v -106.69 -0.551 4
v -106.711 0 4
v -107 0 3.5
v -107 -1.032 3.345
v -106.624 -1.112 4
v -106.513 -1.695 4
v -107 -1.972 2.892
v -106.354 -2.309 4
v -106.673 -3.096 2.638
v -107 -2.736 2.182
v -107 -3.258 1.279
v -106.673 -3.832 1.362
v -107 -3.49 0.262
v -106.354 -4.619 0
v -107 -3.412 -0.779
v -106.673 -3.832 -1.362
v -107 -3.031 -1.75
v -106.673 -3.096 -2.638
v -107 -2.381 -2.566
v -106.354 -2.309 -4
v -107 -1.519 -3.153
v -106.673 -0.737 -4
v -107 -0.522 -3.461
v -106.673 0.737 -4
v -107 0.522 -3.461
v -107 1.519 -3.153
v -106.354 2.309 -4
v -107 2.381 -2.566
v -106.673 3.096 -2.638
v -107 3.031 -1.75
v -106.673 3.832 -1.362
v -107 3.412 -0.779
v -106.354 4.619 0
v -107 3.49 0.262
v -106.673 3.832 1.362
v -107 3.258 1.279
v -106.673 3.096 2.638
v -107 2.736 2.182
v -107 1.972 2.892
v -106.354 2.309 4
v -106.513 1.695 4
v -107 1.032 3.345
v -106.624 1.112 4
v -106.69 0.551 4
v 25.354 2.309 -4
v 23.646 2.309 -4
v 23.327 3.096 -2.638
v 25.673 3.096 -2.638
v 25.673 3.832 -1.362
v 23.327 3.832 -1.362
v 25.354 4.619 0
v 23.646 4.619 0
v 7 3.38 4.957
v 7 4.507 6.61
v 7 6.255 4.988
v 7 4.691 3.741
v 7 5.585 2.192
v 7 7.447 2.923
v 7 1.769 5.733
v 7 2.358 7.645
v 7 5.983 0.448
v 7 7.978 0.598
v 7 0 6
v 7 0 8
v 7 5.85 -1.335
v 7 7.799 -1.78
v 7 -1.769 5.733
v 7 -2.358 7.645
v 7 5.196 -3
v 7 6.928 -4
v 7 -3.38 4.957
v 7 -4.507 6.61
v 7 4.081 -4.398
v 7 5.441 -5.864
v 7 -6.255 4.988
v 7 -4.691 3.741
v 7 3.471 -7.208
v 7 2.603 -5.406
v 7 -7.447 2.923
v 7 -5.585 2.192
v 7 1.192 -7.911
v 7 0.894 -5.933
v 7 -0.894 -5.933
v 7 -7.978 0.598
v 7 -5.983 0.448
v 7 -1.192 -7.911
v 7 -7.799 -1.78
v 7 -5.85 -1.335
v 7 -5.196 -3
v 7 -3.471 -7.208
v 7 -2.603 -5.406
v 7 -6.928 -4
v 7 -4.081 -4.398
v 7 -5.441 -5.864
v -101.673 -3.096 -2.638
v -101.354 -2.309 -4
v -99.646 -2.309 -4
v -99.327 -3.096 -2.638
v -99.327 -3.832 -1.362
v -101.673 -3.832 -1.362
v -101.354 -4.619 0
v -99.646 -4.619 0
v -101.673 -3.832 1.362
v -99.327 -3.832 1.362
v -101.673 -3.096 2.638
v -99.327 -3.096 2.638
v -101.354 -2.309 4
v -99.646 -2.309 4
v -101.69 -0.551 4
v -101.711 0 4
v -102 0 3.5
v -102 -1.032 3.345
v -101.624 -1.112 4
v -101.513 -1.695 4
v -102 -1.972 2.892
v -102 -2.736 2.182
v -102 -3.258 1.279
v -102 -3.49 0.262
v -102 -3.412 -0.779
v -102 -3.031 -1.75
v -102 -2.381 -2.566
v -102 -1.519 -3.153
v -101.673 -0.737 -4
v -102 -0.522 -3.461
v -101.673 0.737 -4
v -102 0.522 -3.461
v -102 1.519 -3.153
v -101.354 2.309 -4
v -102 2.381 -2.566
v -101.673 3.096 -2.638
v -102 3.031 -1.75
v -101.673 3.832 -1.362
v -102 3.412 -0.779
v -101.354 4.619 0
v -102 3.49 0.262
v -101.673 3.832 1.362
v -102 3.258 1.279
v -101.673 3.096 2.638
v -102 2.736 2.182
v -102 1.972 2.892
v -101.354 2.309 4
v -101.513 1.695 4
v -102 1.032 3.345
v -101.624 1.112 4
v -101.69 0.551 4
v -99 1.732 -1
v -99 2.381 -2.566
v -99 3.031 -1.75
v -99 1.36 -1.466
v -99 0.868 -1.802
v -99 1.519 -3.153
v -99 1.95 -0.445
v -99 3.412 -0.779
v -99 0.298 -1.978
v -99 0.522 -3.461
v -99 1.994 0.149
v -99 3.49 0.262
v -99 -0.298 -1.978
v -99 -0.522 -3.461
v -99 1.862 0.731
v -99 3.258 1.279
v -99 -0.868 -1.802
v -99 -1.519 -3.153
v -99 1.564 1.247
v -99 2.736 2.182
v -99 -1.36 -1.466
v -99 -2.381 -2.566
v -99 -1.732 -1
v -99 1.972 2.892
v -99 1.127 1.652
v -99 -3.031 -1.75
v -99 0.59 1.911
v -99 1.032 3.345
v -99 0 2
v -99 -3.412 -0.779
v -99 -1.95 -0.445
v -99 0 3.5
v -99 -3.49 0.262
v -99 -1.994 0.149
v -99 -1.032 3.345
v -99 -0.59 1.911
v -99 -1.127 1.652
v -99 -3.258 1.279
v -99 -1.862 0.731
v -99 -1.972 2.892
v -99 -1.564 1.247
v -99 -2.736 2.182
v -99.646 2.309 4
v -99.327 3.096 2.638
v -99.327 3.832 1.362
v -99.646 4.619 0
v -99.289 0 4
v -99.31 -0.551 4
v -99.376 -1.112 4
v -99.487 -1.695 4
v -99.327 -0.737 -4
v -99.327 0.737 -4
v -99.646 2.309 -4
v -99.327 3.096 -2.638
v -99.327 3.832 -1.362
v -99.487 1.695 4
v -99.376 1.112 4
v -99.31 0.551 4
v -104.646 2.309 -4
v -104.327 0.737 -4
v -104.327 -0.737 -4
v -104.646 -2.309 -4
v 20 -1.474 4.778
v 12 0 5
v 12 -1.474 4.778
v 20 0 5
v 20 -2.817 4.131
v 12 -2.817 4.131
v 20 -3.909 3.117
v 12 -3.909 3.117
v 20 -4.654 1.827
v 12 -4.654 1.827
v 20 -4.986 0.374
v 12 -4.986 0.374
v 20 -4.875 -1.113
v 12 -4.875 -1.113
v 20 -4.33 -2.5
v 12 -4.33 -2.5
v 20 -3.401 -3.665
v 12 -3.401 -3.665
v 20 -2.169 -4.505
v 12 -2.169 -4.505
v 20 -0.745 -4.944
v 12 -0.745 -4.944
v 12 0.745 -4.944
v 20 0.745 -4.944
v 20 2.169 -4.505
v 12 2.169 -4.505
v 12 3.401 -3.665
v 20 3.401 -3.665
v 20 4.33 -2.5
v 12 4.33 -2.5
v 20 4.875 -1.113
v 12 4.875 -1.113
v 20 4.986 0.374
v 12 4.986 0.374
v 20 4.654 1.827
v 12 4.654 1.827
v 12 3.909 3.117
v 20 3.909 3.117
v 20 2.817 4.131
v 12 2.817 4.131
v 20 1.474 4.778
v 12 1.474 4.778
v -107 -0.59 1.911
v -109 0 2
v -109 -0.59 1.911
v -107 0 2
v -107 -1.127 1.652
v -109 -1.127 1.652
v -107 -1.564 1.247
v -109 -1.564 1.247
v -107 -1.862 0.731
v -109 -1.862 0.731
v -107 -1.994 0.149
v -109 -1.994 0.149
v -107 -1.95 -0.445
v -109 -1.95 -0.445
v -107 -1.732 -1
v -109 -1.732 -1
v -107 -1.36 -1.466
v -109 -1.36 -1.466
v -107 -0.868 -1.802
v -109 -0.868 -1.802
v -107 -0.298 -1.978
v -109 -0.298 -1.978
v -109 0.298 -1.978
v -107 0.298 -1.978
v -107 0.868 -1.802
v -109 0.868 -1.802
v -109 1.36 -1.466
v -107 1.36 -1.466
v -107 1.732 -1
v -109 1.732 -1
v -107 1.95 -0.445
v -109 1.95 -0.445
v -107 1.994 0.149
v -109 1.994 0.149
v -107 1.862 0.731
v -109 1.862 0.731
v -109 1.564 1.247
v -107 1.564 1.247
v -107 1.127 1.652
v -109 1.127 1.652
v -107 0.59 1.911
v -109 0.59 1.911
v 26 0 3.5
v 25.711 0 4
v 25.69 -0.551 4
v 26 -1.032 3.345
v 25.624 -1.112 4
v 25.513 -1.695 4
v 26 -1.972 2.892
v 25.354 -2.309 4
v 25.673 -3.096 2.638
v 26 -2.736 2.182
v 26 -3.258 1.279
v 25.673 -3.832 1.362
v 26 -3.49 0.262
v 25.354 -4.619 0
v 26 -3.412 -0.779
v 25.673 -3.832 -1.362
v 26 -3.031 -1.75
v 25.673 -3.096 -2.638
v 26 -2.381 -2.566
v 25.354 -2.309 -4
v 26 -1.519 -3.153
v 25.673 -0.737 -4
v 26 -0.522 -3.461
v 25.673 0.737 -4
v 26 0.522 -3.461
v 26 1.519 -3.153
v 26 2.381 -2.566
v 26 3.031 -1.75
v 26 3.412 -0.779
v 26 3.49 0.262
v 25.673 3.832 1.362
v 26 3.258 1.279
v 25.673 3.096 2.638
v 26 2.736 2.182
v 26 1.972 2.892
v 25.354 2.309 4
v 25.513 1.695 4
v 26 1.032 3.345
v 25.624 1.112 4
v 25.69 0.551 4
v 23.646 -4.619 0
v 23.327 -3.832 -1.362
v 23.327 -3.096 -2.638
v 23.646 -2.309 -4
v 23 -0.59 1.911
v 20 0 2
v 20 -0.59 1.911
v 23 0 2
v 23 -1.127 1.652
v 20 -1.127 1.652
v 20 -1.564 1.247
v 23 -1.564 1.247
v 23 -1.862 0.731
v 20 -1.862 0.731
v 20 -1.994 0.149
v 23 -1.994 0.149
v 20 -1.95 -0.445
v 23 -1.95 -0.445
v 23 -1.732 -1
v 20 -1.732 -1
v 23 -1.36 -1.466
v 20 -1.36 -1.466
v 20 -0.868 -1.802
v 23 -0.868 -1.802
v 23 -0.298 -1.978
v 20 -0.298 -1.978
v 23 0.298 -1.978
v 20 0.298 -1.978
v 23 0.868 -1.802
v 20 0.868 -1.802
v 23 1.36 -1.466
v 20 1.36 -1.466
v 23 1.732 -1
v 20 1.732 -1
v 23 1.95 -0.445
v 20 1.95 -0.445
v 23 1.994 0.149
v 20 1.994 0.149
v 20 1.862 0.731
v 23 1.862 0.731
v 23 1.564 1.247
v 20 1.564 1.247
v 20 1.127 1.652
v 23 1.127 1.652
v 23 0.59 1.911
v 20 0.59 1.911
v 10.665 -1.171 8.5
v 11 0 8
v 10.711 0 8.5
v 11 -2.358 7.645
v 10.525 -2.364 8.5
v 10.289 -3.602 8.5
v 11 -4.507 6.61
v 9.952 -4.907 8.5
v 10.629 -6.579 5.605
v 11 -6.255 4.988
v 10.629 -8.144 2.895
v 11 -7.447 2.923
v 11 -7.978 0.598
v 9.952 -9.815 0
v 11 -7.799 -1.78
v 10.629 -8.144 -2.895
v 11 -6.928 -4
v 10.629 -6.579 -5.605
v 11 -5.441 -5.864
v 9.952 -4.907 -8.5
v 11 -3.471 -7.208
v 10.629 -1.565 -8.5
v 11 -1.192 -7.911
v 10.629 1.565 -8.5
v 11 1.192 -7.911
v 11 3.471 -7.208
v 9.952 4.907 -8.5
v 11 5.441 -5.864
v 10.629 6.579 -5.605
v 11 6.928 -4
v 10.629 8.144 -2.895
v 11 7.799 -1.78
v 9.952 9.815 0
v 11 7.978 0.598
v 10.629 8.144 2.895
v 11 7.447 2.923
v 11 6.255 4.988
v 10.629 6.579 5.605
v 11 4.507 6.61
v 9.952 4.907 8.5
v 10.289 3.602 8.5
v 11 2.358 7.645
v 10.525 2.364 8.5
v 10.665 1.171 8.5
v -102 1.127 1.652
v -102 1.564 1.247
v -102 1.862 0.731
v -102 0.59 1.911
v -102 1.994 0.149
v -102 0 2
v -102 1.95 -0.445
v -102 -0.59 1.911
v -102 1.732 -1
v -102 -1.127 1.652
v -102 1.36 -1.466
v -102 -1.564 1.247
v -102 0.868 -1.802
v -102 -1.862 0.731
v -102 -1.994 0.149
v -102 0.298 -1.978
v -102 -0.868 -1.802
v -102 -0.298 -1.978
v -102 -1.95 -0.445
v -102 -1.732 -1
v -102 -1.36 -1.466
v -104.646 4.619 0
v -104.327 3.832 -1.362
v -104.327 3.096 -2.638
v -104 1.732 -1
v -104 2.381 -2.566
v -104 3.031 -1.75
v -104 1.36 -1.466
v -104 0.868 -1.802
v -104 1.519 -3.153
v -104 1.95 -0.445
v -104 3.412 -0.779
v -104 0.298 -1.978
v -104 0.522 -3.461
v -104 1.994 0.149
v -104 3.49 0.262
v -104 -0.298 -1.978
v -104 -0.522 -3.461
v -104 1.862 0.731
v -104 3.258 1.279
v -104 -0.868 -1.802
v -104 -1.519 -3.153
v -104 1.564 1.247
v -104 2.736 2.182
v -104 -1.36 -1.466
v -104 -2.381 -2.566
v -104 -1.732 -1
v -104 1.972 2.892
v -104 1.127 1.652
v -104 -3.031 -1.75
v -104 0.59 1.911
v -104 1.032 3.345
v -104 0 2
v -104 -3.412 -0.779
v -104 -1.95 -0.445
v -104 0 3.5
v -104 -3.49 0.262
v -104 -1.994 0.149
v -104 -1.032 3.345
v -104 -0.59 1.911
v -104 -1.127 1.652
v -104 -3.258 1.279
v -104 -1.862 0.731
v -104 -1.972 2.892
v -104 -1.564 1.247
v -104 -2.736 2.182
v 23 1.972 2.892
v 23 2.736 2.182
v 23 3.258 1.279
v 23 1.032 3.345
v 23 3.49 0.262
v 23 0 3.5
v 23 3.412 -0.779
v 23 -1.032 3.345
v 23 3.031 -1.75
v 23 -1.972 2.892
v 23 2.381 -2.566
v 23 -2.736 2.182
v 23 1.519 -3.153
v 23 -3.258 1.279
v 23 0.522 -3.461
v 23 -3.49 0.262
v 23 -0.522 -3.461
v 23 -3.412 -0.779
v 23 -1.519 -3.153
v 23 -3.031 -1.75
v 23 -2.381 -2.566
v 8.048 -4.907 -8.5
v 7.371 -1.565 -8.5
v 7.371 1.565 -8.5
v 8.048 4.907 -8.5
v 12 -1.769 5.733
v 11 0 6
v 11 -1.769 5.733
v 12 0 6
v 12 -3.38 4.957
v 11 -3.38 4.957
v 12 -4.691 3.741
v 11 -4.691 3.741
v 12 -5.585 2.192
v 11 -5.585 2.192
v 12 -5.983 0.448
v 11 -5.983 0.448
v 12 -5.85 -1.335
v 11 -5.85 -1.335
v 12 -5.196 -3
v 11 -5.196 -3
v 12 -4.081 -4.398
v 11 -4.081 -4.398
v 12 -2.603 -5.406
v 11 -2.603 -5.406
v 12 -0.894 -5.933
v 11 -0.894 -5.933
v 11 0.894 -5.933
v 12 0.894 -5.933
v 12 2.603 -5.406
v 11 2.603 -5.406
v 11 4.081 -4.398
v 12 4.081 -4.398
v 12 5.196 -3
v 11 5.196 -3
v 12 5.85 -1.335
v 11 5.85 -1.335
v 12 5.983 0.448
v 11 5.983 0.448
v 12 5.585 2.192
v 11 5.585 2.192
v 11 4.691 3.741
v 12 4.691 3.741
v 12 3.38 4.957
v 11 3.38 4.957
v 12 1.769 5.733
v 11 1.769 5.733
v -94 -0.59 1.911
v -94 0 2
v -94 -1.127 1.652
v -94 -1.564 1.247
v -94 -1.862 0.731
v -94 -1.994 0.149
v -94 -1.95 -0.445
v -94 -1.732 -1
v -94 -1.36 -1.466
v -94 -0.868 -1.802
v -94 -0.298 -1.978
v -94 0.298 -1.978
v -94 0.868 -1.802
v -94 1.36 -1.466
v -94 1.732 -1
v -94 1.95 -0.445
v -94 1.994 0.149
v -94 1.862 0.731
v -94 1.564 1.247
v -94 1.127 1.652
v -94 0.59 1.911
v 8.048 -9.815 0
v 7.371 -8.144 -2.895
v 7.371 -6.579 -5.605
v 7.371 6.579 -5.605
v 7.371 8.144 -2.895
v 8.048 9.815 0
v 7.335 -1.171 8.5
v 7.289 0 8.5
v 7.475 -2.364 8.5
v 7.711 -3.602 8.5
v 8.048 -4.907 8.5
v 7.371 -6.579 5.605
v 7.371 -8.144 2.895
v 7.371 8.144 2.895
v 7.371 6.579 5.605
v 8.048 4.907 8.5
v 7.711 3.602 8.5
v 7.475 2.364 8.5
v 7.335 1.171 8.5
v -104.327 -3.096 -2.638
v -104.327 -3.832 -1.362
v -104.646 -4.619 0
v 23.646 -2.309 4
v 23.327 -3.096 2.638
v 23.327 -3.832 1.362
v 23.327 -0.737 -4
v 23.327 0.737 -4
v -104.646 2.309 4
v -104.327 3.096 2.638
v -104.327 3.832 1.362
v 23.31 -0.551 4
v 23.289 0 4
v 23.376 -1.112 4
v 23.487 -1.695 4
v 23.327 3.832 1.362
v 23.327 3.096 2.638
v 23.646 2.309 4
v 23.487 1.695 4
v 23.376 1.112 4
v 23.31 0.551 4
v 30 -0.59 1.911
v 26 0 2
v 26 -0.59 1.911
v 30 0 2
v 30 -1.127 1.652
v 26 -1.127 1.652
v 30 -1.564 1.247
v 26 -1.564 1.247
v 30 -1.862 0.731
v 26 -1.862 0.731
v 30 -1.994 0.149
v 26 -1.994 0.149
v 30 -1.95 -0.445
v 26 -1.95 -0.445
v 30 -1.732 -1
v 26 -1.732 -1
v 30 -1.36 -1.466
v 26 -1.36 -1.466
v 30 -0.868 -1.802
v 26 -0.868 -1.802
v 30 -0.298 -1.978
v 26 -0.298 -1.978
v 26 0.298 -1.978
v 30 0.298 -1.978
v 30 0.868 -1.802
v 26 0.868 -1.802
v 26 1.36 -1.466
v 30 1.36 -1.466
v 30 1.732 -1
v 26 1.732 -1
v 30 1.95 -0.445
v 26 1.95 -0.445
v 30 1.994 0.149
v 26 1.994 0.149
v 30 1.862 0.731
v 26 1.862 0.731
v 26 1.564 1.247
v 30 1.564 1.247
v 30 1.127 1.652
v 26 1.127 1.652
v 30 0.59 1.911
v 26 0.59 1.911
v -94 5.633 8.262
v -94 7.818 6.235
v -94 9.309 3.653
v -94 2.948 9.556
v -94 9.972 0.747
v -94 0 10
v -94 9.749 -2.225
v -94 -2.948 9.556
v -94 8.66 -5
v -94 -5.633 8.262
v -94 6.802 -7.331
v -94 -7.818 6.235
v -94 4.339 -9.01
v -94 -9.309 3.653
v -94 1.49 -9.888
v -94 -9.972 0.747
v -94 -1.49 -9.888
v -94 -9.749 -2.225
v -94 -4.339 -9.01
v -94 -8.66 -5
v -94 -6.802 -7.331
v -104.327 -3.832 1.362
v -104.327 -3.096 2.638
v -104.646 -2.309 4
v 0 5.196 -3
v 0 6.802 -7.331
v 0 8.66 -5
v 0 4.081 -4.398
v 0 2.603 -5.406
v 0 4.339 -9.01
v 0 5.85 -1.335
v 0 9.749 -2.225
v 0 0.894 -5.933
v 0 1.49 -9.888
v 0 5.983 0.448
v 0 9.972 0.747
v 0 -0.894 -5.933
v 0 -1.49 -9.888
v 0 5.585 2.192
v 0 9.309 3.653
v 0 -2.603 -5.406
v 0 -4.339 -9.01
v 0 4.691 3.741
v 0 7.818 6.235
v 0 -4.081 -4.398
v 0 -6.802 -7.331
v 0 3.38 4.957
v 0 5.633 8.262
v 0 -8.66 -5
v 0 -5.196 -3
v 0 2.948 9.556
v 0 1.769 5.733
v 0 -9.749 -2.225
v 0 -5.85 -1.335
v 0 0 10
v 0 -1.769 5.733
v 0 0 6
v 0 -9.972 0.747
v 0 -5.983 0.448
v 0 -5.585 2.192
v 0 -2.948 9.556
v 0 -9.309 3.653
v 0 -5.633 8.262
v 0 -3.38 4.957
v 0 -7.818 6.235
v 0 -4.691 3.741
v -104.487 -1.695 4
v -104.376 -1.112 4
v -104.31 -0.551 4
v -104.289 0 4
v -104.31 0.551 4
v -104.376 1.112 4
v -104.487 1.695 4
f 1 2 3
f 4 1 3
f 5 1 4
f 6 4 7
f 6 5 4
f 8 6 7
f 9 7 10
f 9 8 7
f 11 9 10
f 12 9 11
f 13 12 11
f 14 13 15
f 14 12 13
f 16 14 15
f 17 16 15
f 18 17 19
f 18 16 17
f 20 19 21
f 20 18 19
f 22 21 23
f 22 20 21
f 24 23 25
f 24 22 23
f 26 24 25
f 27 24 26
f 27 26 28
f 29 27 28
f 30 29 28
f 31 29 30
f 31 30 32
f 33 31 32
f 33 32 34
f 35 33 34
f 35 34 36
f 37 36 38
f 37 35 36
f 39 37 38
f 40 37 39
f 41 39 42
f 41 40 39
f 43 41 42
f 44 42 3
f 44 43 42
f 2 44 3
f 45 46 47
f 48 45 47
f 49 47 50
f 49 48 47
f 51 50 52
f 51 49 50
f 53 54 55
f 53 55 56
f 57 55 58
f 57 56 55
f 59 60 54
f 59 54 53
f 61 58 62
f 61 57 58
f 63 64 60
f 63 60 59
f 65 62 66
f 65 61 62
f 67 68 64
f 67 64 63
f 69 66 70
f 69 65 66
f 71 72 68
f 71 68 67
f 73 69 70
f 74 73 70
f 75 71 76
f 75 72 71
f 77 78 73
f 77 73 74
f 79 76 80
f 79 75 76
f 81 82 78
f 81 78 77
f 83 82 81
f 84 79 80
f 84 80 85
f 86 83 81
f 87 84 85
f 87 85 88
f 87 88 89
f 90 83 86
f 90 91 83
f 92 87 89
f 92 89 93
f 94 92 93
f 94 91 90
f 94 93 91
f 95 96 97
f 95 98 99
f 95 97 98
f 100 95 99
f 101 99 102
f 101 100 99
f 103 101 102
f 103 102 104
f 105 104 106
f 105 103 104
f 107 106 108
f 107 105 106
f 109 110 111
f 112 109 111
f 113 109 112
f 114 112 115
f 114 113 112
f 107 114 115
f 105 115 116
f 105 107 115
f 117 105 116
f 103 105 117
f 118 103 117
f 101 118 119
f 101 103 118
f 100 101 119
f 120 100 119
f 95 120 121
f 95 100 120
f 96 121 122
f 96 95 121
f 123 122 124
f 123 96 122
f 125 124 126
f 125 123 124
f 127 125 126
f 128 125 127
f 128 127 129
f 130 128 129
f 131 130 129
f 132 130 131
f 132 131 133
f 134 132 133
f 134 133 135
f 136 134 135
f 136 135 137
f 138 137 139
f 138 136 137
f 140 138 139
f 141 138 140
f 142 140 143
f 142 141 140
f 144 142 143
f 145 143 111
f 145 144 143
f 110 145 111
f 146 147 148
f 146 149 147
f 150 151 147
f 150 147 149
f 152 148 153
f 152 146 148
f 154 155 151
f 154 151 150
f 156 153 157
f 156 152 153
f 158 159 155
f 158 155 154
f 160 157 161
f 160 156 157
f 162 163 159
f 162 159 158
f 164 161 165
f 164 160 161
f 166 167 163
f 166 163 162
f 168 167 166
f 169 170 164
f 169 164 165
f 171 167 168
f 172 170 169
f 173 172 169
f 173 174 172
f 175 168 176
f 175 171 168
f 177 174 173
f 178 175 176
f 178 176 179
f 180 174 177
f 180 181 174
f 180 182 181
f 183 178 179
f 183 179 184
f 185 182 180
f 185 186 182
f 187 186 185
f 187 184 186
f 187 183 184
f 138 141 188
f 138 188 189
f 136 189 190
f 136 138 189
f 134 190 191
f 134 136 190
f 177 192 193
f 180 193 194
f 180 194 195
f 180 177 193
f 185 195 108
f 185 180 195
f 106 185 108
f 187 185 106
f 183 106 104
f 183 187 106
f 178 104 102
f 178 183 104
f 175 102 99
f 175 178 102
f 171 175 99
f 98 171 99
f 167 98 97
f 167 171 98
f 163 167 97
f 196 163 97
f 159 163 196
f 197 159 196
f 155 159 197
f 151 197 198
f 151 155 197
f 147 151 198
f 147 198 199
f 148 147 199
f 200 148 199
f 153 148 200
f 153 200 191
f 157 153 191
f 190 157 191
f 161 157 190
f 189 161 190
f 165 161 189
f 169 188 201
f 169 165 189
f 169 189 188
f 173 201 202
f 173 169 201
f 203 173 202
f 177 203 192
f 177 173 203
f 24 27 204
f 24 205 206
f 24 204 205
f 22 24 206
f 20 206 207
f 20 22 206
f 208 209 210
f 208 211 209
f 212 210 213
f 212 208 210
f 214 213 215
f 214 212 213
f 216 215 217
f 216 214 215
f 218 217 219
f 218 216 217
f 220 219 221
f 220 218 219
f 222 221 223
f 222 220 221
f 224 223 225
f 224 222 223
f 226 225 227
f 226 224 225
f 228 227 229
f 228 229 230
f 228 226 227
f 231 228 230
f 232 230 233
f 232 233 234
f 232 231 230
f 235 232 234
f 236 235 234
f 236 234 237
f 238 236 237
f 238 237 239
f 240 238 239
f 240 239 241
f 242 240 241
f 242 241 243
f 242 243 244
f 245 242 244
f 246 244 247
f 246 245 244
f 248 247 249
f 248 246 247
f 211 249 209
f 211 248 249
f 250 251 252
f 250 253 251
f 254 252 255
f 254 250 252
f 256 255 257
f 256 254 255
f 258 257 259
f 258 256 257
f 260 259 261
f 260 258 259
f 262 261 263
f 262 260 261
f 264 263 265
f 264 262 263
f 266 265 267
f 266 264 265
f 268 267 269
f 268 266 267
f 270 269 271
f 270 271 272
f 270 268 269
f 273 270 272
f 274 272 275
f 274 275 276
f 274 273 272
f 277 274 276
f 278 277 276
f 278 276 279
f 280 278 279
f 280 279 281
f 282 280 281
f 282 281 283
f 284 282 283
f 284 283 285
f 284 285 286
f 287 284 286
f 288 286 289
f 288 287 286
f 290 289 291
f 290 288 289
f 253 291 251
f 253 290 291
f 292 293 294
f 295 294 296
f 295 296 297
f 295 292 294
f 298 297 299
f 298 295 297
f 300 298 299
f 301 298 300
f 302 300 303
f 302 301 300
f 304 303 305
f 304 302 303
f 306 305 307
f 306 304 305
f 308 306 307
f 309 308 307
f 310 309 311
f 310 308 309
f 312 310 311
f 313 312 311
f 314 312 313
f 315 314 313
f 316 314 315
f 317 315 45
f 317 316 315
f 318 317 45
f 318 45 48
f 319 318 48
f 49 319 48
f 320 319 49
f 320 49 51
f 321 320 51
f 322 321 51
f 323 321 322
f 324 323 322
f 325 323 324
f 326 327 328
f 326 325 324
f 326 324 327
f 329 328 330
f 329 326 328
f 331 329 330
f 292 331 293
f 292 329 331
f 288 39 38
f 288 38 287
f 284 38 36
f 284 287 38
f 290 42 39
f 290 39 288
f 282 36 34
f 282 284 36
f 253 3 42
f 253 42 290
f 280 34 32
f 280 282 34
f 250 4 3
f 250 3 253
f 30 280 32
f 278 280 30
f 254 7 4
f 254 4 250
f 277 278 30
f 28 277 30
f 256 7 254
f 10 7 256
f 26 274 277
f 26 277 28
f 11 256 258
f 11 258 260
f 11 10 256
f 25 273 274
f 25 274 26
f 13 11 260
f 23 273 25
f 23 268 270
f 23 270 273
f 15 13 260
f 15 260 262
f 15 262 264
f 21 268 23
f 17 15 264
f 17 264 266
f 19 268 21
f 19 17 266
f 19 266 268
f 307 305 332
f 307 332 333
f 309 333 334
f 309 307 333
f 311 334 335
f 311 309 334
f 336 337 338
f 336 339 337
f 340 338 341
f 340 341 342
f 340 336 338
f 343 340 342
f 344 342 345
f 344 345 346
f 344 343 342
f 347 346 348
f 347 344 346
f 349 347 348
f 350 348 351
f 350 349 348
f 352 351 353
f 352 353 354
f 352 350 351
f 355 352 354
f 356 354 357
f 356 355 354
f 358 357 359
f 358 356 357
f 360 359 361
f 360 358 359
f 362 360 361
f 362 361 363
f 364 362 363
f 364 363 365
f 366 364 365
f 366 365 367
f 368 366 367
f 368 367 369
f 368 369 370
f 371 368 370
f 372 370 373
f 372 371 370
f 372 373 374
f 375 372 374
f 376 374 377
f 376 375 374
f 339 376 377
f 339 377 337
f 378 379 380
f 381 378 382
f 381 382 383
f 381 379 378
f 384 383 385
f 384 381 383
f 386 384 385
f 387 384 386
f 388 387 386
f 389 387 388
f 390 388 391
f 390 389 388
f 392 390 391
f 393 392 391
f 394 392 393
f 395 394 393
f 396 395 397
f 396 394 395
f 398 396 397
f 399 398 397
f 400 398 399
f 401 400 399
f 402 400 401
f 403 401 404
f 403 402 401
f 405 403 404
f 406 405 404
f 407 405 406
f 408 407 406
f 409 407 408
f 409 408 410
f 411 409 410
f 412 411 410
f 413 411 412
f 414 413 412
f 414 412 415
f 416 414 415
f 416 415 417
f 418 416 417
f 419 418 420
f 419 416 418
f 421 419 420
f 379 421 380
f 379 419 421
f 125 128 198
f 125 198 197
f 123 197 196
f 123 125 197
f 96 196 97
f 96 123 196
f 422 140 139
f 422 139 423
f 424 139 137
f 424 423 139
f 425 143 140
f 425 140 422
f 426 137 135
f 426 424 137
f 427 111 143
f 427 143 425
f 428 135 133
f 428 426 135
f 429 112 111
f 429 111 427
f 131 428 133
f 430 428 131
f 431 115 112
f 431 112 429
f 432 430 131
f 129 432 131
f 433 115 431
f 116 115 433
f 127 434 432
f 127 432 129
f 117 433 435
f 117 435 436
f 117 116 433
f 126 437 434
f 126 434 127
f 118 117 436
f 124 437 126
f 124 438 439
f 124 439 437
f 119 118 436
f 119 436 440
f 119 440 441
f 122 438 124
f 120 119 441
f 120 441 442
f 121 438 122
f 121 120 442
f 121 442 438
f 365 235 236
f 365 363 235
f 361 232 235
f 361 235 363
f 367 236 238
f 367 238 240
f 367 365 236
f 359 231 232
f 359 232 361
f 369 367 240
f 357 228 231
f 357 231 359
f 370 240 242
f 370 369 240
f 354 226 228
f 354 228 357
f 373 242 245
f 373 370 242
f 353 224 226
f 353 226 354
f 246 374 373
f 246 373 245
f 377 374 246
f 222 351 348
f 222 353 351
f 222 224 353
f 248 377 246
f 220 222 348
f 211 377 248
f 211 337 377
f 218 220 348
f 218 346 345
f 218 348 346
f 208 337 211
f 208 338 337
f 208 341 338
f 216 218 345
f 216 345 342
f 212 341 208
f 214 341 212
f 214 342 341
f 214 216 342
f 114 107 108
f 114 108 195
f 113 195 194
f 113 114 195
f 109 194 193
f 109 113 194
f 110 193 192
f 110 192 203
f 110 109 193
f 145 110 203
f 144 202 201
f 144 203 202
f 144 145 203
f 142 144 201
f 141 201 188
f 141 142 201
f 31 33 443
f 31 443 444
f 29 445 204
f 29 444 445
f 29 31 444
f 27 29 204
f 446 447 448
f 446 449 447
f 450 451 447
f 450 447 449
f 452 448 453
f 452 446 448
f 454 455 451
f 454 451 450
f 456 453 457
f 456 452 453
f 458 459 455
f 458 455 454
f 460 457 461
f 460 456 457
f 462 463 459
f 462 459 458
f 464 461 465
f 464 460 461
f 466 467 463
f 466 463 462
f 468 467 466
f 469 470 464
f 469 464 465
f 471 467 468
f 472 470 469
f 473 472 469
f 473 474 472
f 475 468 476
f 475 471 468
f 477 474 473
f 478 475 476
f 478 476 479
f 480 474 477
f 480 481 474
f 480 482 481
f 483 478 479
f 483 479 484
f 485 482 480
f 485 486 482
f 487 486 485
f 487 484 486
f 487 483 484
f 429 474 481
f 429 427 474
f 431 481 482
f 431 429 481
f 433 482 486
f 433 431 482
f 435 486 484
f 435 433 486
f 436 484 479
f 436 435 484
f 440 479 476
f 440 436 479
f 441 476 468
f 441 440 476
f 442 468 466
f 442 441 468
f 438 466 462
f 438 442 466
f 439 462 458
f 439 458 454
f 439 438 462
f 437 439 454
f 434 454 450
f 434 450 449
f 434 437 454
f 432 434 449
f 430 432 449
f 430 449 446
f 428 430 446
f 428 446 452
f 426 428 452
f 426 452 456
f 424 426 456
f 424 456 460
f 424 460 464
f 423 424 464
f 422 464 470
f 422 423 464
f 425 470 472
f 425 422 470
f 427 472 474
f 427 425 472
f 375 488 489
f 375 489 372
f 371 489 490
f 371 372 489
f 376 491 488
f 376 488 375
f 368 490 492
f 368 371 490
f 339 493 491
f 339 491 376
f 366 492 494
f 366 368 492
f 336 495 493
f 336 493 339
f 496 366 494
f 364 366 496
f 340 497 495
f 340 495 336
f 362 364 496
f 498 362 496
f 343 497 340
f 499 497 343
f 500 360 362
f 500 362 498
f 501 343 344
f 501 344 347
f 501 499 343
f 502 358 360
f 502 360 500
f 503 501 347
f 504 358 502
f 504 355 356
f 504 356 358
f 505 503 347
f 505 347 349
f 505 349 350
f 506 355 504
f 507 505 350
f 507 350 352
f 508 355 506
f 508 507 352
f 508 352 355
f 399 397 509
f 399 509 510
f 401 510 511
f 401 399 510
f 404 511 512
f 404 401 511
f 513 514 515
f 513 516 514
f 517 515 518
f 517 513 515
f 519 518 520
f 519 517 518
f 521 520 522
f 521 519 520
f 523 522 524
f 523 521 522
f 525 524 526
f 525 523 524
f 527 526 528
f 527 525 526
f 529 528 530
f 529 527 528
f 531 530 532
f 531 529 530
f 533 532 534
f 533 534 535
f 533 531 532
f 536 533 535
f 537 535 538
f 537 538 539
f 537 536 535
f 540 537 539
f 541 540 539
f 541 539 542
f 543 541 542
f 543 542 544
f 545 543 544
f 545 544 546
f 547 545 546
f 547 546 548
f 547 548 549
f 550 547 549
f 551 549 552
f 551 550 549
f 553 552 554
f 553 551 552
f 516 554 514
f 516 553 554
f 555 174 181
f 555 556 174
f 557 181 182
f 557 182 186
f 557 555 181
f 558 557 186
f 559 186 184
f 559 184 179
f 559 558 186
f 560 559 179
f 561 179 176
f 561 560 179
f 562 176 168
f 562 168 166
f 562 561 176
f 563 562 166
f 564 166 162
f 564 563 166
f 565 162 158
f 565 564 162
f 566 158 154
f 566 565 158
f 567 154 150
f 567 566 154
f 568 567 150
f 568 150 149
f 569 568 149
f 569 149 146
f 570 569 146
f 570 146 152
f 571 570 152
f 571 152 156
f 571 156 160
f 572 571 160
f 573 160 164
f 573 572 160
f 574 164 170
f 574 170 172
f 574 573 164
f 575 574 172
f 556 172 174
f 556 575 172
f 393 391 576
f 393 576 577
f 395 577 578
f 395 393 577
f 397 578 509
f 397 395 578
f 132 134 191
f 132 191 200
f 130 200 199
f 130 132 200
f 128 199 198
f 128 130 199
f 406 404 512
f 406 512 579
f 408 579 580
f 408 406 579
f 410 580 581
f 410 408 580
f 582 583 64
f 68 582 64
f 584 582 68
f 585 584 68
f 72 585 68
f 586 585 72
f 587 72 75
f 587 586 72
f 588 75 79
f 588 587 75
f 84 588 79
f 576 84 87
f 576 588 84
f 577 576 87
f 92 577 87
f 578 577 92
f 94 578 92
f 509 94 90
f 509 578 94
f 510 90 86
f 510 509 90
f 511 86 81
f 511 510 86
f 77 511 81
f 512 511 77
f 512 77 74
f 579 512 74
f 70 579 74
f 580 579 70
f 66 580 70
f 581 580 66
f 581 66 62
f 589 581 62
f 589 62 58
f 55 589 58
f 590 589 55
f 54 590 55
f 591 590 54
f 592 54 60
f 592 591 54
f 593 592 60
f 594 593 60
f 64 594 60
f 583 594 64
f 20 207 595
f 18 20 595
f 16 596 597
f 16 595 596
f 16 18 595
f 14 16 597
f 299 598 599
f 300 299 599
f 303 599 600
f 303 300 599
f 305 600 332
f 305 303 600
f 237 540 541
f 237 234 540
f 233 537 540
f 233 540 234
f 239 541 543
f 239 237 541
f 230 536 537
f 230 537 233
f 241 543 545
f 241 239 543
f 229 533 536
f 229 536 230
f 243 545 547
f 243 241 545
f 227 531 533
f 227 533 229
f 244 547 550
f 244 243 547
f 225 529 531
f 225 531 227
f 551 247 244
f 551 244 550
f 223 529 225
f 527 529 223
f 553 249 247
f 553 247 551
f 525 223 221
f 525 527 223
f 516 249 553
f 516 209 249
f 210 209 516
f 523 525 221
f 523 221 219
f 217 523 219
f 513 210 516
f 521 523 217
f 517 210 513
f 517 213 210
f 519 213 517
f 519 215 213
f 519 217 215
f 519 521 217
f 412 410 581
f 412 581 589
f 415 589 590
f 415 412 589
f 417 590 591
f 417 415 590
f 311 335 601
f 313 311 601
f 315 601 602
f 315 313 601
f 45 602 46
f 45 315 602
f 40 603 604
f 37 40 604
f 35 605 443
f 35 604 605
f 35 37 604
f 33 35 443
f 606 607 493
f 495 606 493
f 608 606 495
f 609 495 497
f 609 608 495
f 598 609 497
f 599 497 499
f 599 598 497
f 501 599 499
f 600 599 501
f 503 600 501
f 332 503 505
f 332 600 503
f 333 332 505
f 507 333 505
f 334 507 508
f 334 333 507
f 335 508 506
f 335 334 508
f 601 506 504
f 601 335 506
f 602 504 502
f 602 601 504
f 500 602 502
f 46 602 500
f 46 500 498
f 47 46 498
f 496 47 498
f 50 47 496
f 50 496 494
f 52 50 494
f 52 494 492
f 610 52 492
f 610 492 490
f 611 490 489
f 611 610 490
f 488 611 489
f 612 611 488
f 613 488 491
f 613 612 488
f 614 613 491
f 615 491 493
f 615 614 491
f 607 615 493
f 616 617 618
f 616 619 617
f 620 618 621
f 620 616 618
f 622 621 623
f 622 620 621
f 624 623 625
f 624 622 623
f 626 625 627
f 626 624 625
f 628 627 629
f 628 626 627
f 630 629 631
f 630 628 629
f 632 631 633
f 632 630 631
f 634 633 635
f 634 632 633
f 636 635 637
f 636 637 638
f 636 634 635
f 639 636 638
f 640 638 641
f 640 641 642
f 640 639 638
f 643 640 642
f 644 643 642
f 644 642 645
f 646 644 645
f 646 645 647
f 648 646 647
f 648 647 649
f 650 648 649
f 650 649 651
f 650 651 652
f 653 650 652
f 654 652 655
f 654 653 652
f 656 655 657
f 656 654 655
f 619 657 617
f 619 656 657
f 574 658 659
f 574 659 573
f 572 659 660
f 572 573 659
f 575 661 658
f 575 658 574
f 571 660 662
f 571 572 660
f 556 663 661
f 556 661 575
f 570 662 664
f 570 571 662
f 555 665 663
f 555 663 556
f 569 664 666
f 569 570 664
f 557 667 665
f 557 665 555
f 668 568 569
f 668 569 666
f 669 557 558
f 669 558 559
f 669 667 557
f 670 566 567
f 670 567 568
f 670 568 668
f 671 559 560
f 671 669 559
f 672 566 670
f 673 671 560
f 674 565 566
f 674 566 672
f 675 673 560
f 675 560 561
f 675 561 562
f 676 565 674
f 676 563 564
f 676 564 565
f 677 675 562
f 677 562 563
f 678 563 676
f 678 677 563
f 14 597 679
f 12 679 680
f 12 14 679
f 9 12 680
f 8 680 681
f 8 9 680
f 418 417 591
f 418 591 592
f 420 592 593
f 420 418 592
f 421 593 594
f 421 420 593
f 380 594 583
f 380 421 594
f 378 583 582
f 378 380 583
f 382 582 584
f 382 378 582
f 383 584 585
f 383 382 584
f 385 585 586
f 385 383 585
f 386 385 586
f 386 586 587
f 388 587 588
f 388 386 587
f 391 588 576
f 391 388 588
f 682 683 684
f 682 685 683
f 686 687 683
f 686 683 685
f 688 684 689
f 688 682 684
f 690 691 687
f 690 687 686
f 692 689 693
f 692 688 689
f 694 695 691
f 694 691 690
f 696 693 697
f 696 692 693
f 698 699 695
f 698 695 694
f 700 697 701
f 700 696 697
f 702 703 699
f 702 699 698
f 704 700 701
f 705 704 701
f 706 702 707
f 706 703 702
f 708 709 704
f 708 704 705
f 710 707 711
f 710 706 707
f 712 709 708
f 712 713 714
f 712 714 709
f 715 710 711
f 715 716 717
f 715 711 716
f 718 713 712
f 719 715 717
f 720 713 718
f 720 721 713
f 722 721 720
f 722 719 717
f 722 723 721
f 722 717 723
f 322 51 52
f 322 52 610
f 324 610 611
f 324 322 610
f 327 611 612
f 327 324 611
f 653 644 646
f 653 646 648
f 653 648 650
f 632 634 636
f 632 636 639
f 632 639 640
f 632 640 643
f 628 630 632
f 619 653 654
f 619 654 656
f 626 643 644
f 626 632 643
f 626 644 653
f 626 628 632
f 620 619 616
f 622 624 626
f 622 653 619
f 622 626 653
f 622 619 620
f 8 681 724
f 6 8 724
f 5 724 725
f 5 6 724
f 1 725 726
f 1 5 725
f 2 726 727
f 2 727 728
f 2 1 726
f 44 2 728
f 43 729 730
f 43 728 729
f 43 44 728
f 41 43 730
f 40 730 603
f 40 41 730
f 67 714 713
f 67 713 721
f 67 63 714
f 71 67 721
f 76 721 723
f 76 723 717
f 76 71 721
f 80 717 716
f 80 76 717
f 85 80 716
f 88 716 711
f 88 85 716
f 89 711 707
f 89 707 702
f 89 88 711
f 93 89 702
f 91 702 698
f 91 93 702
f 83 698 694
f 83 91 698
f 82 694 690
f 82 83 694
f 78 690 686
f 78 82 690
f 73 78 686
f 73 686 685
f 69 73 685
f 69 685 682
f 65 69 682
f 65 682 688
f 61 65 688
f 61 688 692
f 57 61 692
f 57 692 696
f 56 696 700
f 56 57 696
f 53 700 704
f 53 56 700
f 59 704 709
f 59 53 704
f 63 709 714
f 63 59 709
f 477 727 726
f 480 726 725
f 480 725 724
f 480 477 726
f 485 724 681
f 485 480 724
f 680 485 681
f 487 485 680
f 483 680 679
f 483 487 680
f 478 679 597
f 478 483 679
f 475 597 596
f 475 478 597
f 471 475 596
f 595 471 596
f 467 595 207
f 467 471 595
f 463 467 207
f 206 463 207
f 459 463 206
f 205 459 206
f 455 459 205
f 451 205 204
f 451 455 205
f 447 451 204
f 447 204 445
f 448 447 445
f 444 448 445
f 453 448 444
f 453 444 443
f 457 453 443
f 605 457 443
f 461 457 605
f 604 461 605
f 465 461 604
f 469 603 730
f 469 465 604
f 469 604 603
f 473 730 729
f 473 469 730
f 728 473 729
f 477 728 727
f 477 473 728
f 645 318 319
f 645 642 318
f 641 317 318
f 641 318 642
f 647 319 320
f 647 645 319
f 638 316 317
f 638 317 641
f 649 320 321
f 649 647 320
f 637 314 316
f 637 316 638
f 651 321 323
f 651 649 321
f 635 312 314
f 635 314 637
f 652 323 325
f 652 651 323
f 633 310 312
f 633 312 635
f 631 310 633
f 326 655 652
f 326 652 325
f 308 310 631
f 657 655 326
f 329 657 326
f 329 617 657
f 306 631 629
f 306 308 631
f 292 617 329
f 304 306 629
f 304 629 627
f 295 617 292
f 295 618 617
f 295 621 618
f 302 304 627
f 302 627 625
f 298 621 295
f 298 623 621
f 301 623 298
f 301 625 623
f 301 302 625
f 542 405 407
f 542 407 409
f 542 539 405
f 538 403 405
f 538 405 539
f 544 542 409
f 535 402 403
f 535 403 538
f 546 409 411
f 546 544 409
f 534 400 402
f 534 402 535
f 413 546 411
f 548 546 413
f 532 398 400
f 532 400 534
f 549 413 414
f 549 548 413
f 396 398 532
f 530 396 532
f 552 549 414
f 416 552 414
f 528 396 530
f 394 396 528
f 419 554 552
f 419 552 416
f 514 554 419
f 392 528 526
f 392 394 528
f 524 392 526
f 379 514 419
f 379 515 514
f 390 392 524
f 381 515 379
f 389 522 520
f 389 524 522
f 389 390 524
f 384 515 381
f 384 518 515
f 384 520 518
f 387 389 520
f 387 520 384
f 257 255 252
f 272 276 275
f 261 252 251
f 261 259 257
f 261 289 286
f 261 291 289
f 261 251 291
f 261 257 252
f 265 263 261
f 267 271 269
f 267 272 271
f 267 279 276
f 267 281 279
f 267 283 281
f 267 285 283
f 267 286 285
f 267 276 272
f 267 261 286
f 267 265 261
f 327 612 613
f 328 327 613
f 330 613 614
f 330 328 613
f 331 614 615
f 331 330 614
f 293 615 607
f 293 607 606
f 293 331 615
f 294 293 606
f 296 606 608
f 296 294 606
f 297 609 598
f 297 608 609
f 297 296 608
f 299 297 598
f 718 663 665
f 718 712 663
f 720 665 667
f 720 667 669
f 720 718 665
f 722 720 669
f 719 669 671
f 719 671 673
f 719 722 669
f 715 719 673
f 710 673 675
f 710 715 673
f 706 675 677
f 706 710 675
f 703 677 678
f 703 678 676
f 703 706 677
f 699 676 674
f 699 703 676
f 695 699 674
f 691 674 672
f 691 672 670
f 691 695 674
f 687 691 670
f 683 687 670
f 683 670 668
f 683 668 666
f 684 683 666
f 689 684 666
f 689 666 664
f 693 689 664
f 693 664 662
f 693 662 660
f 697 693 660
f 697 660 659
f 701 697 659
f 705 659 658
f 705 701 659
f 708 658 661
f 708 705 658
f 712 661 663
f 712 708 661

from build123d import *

# Parameters (mm, degrees)
SKETCH2_OUTSIDE_W  = 53.474
SKETCH2_OUTSIDE_H  = 53.474
CUT_EXTRUDE1_DEPTH = 3
SKETCH3_OUTSIDE_W  = 53.474
SKETCH3_OUTSIDE_H  = 53.474
CUT_EXTRUDE2_DEPTH = 4
SKETCH4_OUTSIDE_W  = 50.37
SKETCH4_OUTSIDE_H  = 50.37
CUT_EXTRUDE3_DEPTH = 8


with BuildPart() as part:
    # Sketch1 → Revolve1 (revolve)
    with BuildSketch(Plane.XY, mode=Mode.PRIVATE) as revolve1_sk:
        Polygon((30, 0), (-109, 0), (-109, 2), (-107, 2), (-107, 3.5), (-105.5, 6.098076211), (-104, 3.5), (-104, 2), (-102, 2), (-102, 3.5), (-100.5, 6.098076211), (-99, 3.5), (-99, 2), (-94, 2), (-94, 10), (0, 10), (0, 6), (7, 6), (7, 8), (9, 11.464101615), (11, 8), (11, 6), (12, 6), (12, 5), (20, 5), (20, 2), (23, 2), (23, 3.5), (24.5, 6.098076211), (26, 3.5), (26, 2), (30, 2), align=None)
    revolve(revolve1_sk.sketch.rotate(Axis((30, 0, 0), (1, 0, 0)), 90), axis=Axis((30, 0, 0), (1, 0, 0)))

    # Sketch2 outside → Cut-Extrude1 (cut)
    with BuildSketch(Plane(origin=(26, 0, 0), x_dir=(0, 0, -1), z_dir=(1, 0, 0))):
        Rectangle(SKETCH2_OUTSIDE_W, SKETCH2_OUTSIDE_H)
        Polygon((0, -4.618802154), (4, -2.309401077), (4, 2.309401077), (0, 4.618802154), (-4, 2.309401077), (-4, -2.309401077), align=None, mode=Mode.SUBTRACT)
    extrude(amount=-CUT_EXTRUDE1_DEPTH, mode=Mode.SUBTRACT)

    # Sketch3 outside → Cut-Extrude2 (cut)
    with BuildSketch(Plane(origin=(11, 0, 0), x_dir=(0, 0, -1), z_dir=(1, 0, 0))):
        Rectangle(SKETCH3_OUTSIDE_W, SKETCH3_OUTSIDE_H)
        Polygon((0, 9.814954576), (-8.5, 4.907477288), (-8.5, -4.907477288), (0, -9.814954576), (8.5, -4.907477288), (8.5, 4.907477288), align=None, mode=Mode.SUBTRACT)
    extrude(amount=-CUT_EXTRUDE2_DEPTH, mode=Mode.SUBTRACT)

    # Sketch4 outside → Cut-Extrude3 (cut)
    with BuildSketch(Plane.ZY.offset(107)):
        Rectangle(SKETCH4_OUTSIDE_W, SKETCH4_OUTSIDE_H)
        Polygon((0, 4.618802154), (-4, 2.309401077), (-4, -2.309401077), (0, -4.618802154), (4, -2.309401077), (4, 2.309401077), align=None, mode=Mode.SUBTRACT)
    extrude(amount=-CUT_EXTRUDE3_DEPTH, mode=Mode.SUBTRACT)


solid = part.part
